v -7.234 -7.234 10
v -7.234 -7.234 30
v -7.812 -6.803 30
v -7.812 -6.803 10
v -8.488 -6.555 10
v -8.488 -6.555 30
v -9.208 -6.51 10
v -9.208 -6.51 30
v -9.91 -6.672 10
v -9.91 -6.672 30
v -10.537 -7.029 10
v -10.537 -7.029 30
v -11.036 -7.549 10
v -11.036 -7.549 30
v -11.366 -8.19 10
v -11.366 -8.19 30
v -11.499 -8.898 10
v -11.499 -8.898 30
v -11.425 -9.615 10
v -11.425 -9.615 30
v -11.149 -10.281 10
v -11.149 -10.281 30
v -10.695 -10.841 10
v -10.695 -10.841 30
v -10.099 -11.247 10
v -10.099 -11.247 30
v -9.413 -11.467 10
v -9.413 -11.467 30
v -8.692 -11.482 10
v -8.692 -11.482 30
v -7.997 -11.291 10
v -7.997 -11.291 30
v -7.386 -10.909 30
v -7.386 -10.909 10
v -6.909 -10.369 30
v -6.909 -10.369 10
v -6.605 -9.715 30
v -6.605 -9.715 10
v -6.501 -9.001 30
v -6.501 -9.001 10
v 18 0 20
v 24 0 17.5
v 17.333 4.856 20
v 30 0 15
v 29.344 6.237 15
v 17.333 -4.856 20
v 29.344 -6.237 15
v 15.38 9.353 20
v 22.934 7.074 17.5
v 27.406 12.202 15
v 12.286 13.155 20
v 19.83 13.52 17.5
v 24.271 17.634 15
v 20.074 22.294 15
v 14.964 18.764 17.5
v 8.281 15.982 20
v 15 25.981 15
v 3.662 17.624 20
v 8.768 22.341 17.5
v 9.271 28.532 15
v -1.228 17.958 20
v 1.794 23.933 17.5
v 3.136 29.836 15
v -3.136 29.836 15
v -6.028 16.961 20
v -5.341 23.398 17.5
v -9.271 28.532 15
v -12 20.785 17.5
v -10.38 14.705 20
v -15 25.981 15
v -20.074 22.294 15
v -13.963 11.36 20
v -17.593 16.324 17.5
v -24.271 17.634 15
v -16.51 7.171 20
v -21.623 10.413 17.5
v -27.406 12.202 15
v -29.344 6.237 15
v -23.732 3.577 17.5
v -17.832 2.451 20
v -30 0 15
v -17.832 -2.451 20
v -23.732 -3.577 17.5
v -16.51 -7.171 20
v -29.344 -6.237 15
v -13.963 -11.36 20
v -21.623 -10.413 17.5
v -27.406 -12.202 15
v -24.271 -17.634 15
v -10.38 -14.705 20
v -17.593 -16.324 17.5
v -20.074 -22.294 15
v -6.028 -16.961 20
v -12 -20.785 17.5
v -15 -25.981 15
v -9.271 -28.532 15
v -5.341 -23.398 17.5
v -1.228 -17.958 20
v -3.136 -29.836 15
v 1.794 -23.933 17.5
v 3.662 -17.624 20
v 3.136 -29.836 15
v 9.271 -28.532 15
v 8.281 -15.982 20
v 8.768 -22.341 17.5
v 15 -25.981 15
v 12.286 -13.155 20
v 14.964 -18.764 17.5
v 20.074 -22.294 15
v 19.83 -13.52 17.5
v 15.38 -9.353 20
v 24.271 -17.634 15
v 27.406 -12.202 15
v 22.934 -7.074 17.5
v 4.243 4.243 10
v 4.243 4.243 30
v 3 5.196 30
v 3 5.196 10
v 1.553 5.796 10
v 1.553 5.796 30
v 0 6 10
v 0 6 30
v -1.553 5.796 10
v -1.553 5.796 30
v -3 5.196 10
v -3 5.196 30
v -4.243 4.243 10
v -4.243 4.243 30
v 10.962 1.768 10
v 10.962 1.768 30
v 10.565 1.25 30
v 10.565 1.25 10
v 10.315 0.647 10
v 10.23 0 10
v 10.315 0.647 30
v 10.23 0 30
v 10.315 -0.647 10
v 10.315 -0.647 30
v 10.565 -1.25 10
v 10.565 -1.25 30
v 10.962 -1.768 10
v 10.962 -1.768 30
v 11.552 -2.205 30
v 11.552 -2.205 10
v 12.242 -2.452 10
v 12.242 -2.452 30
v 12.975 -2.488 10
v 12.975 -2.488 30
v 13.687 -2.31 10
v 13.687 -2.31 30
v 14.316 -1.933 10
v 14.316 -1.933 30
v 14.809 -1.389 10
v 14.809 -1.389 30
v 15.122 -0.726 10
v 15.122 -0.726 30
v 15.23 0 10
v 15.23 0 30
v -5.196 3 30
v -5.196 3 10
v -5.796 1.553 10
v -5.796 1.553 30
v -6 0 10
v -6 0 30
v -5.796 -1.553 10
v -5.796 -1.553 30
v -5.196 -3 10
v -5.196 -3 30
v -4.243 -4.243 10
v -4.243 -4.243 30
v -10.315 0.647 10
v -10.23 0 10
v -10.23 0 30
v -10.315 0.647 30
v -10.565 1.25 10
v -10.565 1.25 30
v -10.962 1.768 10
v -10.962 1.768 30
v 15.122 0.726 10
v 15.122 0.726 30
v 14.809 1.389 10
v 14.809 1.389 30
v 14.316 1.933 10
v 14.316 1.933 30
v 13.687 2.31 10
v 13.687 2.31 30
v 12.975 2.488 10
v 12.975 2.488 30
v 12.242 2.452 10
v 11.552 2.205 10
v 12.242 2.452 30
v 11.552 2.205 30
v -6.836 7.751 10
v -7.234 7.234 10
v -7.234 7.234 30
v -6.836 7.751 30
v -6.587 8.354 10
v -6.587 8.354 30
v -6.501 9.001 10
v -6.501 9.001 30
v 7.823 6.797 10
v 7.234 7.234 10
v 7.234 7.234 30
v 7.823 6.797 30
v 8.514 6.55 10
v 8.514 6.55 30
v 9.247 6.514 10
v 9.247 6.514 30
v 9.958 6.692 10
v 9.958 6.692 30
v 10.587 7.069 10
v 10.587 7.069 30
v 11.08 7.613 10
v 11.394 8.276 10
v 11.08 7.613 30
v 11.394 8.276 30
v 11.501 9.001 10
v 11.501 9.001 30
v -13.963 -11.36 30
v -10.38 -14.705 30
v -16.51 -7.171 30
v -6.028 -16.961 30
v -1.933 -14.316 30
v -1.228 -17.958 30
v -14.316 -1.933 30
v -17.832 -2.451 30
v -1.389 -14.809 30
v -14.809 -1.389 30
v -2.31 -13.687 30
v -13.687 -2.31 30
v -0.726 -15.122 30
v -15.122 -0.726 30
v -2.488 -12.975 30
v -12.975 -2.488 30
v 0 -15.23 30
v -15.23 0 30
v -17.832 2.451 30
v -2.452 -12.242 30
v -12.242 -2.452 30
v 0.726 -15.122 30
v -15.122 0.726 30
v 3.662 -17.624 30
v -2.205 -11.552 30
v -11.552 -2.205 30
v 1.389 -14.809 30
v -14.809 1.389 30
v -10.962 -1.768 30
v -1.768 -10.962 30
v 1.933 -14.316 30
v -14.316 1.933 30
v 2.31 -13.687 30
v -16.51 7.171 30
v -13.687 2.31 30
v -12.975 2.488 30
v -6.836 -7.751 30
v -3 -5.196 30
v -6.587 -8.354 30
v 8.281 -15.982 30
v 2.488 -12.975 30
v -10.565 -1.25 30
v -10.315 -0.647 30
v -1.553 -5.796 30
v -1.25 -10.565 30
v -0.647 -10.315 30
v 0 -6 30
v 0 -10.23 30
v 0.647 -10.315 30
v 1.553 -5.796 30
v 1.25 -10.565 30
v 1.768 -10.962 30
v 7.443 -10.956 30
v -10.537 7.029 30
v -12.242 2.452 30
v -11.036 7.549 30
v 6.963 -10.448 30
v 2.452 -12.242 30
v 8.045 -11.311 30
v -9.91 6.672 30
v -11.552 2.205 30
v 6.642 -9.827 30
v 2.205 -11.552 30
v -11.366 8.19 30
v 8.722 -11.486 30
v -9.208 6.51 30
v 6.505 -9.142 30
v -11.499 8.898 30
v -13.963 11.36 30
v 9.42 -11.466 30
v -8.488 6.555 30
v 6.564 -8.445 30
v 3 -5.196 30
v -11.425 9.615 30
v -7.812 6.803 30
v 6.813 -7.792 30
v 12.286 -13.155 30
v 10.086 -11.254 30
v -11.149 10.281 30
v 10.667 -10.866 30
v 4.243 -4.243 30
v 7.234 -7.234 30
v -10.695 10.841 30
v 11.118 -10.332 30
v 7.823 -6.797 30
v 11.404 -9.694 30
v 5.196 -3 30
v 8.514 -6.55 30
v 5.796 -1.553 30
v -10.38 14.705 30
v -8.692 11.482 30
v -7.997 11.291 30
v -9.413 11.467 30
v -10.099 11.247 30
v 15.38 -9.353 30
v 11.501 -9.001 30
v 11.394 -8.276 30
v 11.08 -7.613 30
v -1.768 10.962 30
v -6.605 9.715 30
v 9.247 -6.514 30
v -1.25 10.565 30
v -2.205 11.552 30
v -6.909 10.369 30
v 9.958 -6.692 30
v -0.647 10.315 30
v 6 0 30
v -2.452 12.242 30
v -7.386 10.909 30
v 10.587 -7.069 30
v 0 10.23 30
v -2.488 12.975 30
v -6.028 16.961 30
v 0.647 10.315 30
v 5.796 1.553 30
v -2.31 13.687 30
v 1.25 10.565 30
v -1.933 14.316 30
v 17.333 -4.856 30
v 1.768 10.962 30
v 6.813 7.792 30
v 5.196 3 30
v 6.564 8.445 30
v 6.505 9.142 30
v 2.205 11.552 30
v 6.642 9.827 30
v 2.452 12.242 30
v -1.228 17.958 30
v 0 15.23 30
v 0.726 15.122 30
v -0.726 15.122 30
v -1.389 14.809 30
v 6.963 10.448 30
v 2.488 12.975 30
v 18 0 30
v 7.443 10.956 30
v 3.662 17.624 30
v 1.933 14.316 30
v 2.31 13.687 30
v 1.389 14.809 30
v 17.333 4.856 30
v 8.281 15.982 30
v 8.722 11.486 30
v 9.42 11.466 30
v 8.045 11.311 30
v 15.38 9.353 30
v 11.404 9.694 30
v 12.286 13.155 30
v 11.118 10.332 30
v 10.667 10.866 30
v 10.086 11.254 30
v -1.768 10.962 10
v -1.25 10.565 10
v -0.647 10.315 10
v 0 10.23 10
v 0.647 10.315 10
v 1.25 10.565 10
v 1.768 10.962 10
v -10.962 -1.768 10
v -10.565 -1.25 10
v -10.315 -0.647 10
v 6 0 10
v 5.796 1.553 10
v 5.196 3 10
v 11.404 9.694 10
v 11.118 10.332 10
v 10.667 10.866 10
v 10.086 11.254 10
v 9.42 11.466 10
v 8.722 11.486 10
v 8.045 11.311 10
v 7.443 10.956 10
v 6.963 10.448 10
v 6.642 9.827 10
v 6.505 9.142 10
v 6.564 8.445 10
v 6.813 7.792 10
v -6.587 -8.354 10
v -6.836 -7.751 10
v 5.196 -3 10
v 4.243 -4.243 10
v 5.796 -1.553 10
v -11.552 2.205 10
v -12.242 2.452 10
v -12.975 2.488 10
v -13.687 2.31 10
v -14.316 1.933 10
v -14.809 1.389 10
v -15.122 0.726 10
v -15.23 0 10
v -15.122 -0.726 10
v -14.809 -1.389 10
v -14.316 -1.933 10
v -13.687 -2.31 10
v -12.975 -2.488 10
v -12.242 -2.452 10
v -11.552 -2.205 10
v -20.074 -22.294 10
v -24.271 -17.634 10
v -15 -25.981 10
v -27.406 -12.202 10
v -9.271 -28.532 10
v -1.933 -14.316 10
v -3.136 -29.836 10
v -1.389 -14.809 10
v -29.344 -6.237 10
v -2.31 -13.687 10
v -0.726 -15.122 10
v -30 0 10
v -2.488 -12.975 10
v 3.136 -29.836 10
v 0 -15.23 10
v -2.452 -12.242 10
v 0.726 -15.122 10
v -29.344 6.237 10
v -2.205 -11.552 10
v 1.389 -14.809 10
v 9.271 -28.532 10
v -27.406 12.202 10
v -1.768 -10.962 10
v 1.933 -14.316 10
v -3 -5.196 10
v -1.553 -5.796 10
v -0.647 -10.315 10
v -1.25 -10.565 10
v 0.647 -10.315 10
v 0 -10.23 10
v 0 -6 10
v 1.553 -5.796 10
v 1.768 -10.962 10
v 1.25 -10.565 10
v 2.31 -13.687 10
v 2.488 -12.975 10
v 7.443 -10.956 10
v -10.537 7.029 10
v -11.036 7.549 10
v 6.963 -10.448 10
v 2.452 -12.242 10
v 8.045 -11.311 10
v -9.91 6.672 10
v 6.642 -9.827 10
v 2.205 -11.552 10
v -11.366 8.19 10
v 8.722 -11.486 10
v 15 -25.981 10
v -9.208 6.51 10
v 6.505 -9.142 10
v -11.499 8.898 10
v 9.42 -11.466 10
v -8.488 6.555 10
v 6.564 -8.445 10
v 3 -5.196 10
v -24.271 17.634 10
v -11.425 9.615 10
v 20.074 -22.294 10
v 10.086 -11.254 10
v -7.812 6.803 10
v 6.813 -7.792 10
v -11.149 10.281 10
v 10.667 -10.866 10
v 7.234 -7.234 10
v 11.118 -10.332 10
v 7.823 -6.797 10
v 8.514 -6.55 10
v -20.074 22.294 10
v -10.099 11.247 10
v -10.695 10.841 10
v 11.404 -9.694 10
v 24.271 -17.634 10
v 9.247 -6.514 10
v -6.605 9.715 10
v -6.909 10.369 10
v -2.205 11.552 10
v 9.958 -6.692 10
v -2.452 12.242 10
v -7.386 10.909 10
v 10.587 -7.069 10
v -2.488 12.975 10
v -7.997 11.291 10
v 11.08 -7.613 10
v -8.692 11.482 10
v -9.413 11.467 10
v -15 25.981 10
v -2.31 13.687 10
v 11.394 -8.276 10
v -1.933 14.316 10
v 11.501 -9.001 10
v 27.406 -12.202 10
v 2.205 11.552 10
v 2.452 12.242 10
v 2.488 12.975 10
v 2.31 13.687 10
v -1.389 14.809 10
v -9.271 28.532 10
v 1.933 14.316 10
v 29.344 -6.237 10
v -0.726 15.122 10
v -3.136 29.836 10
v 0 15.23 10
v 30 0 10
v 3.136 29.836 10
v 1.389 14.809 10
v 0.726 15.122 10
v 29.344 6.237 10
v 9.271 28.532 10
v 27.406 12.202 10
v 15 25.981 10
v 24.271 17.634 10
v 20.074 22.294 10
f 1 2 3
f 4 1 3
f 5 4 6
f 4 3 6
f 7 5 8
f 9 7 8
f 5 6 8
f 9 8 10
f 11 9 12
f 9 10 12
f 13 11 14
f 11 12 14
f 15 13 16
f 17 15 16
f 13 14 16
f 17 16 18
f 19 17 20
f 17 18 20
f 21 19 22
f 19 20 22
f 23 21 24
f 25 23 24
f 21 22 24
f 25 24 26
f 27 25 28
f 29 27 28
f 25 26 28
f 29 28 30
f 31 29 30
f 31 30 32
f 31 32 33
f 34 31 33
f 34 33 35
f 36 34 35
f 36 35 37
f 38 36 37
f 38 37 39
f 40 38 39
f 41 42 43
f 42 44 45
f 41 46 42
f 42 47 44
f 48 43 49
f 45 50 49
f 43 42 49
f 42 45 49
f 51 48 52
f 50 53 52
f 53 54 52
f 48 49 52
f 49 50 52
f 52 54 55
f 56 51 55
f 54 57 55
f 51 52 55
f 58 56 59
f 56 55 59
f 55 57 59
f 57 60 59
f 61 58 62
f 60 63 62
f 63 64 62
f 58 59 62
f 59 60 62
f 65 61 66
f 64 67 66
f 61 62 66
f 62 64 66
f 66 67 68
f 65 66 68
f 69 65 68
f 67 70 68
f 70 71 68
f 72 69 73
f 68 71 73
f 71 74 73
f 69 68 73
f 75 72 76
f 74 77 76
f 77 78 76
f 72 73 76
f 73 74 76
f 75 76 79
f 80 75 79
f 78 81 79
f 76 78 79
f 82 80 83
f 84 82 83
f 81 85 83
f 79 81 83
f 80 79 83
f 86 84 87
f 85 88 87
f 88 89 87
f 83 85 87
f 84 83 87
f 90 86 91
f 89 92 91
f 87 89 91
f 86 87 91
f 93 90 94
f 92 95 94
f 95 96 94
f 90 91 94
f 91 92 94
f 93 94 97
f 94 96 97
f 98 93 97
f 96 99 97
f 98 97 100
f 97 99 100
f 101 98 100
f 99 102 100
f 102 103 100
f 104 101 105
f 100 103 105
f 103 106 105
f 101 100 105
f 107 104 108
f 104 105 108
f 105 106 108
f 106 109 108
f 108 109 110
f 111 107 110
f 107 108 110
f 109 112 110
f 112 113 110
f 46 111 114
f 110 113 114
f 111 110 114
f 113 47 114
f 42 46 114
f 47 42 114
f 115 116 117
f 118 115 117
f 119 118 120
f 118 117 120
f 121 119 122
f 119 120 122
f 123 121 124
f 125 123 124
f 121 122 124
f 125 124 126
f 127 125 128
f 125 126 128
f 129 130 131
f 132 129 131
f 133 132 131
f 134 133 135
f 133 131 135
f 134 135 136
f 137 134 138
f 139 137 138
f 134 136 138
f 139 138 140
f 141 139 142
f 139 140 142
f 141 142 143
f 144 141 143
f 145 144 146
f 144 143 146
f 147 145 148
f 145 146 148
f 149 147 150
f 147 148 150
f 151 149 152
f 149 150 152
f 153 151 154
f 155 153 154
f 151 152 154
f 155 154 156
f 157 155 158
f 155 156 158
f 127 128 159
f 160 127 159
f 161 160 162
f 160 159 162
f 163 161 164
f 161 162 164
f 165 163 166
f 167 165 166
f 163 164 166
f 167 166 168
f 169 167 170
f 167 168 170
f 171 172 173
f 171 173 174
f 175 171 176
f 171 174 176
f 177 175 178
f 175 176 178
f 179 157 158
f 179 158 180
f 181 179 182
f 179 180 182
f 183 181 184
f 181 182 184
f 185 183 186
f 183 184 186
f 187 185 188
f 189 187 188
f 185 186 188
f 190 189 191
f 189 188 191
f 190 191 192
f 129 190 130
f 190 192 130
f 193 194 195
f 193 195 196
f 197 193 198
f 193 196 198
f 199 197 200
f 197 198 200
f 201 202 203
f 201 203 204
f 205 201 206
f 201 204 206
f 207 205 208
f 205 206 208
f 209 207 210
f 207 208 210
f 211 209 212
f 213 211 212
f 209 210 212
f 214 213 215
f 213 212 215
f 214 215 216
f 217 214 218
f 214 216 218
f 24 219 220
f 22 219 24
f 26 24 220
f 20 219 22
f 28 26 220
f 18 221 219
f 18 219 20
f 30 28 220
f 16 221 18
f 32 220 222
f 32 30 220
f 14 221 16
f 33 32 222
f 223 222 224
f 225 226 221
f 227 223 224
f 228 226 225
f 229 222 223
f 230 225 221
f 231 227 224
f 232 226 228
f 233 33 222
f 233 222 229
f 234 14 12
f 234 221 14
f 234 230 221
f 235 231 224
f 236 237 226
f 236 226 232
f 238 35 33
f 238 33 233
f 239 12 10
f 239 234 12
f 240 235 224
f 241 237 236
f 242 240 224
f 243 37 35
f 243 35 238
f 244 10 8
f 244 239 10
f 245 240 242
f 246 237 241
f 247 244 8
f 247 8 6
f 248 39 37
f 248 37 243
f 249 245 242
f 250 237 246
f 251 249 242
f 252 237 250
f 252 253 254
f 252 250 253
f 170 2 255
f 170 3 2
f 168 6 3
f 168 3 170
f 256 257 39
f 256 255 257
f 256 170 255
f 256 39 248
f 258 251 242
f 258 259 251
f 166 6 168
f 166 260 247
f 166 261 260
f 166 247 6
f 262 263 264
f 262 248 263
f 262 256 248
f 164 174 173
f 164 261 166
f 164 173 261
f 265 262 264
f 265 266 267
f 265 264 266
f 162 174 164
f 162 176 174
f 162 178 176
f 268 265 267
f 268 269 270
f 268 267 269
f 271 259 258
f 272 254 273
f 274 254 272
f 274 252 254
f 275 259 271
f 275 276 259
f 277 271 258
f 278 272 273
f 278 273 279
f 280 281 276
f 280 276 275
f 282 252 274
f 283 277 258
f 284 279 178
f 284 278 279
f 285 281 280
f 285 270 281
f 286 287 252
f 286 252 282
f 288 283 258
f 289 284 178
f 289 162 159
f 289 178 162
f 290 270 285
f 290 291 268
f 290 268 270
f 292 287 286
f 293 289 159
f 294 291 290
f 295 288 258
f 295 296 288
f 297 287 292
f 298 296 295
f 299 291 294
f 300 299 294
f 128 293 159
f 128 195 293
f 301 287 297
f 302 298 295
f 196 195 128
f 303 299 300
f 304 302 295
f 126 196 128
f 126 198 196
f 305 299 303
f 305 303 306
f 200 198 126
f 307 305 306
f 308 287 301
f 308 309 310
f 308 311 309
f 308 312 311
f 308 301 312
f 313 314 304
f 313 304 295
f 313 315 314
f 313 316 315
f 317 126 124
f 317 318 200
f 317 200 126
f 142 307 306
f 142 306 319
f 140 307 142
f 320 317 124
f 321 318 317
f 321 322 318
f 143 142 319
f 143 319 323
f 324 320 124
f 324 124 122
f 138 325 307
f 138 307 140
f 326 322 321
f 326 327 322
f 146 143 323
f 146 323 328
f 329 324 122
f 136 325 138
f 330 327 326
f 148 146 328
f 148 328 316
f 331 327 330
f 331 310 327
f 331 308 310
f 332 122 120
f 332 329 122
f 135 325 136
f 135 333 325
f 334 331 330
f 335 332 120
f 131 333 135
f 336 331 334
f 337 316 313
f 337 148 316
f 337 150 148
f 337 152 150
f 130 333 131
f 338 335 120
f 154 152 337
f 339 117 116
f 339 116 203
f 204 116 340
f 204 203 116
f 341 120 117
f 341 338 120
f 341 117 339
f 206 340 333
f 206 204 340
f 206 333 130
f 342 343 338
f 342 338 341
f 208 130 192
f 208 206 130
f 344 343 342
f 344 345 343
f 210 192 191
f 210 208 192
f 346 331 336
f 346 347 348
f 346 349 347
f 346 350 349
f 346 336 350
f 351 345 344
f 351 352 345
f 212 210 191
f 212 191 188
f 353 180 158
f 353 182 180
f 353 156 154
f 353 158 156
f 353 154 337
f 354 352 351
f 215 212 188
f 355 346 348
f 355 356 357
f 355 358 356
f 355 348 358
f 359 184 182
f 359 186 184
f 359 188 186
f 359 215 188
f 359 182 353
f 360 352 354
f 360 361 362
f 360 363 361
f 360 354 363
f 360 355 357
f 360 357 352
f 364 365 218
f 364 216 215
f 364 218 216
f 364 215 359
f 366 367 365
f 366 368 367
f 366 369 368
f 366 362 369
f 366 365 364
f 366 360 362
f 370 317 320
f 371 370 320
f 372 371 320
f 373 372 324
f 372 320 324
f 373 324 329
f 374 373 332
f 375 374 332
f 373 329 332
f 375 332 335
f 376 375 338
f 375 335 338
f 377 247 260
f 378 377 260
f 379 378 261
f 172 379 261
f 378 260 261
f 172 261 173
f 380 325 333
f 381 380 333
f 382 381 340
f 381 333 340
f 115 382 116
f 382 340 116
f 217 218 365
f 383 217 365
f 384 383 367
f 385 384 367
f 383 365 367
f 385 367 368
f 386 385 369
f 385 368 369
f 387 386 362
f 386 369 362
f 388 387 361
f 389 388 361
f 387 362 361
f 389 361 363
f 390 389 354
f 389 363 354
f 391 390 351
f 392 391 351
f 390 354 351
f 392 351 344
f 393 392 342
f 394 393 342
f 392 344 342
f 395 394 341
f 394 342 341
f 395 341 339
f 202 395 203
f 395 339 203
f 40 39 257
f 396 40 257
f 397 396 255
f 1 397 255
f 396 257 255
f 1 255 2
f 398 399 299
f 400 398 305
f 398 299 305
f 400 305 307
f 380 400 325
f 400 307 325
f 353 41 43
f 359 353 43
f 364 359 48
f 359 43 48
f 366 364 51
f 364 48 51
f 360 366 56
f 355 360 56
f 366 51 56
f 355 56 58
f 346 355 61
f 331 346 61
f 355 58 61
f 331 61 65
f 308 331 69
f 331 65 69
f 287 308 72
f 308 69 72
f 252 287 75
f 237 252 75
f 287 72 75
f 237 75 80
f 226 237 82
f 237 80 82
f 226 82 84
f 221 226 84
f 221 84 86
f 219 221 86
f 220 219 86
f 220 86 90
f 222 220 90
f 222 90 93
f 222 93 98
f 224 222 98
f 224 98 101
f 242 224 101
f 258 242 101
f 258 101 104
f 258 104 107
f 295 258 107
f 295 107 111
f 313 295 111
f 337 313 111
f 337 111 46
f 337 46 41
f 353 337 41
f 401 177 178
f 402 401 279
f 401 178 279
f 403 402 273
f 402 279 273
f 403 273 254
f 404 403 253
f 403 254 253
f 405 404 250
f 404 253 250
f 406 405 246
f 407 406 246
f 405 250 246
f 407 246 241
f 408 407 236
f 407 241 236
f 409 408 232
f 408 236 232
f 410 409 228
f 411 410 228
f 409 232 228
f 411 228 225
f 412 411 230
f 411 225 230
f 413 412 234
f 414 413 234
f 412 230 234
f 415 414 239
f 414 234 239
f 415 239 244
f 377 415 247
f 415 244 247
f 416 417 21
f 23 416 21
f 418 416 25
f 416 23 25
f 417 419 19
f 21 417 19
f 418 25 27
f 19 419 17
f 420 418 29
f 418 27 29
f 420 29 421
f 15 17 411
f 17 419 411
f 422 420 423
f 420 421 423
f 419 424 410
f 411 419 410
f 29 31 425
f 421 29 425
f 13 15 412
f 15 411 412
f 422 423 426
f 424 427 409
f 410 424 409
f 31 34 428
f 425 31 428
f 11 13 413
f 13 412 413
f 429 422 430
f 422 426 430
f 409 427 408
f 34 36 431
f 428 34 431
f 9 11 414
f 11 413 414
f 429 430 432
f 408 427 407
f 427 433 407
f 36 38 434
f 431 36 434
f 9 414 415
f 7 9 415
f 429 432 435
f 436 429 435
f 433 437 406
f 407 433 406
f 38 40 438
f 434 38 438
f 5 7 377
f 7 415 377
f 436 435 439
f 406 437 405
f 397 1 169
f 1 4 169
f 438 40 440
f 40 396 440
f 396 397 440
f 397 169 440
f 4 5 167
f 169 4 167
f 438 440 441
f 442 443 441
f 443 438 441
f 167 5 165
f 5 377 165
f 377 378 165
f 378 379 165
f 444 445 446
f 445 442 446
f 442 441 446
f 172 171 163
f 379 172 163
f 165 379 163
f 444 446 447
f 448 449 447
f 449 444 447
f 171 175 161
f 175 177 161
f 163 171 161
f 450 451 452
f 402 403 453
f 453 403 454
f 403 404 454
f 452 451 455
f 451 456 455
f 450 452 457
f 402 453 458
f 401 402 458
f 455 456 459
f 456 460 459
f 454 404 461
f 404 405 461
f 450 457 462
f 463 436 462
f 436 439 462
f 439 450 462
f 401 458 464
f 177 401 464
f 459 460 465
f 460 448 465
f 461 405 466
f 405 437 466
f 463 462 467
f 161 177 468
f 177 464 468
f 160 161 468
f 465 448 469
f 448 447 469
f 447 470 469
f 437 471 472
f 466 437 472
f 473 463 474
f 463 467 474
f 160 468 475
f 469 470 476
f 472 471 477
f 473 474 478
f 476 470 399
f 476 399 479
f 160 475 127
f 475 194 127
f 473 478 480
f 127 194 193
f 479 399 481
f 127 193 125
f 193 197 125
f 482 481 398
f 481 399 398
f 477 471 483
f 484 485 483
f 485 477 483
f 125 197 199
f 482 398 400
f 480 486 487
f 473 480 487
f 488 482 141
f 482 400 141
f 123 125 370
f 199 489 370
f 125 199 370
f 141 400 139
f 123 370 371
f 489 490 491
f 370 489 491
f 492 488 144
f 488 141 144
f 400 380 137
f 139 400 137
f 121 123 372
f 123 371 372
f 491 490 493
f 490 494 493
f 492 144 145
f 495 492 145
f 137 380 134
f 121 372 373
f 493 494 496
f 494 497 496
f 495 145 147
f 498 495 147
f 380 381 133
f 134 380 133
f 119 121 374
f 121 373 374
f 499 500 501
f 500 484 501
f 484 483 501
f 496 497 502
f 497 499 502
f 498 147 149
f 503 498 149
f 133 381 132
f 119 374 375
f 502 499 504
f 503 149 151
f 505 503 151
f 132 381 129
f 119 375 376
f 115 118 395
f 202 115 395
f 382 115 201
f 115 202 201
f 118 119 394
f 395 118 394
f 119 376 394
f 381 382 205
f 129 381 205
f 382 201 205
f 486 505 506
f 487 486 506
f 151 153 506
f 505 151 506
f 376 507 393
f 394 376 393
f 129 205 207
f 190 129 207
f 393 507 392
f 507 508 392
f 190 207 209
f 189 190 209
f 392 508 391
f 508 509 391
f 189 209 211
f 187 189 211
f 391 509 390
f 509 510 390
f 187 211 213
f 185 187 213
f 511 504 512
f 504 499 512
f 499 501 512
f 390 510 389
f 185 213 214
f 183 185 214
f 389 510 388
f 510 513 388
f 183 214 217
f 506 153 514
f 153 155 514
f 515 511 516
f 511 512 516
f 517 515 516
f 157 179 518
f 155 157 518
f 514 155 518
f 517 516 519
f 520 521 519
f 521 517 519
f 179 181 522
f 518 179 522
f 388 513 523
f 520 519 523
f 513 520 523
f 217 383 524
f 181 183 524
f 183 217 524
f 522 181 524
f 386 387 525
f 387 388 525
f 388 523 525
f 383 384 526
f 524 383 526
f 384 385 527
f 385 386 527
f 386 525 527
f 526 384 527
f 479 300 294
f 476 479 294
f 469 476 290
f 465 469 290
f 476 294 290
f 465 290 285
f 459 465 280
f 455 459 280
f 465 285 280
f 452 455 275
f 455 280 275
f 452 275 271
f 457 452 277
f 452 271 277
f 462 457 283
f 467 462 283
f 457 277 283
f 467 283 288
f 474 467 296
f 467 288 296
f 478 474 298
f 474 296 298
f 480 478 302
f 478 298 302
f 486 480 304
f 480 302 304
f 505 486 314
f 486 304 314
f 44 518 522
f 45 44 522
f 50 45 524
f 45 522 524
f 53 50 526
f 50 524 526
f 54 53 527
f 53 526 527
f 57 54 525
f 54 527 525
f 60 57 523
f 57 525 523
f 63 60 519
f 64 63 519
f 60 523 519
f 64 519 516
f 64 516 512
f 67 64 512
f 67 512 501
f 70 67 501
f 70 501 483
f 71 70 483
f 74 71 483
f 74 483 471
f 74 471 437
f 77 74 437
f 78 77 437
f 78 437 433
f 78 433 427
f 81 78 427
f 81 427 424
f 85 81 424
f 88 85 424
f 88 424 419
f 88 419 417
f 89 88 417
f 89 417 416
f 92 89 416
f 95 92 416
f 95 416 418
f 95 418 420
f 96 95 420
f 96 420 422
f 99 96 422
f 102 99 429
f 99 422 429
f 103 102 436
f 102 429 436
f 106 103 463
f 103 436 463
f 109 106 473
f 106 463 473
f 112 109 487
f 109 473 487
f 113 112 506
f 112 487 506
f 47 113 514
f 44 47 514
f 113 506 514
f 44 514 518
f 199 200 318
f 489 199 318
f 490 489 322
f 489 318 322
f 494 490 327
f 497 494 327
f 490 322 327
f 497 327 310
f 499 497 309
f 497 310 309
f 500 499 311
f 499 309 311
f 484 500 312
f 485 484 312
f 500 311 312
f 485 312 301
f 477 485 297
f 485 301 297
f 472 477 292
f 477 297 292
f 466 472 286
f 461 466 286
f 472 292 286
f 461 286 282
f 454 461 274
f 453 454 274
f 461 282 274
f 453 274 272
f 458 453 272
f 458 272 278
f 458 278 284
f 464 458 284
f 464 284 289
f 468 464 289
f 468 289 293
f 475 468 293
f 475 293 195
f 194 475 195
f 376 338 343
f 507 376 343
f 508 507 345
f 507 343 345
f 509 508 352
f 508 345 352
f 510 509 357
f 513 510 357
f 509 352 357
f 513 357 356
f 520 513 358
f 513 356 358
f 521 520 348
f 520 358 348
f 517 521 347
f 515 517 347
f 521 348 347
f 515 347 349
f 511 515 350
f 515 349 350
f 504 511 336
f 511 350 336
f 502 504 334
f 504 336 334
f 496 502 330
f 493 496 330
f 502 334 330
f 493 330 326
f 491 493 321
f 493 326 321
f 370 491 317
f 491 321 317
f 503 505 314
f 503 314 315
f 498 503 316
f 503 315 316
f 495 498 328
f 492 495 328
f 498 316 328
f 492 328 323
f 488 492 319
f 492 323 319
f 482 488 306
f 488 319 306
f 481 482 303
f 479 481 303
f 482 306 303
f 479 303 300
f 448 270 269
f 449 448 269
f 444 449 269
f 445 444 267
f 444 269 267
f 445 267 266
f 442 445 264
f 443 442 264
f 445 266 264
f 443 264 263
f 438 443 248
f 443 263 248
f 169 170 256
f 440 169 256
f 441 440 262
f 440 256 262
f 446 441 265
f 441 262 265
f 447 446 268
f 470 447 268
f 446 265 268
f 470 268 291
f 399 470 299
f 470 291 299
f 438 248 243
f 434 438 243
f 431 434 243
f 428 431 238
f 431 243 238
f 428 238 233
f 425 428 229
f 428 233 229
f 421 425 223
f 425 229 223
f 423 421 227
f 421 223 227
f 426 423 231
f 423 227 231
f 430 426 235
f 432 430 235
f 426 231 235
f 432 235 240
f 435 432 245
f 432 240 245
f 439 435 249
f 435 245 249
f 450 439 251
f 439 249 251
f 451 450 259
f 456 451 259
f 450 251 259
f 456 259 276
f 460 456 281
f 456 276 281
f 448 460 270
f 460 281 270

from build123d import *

# Parameters (mm, degrees)
F0_R     = 30
F1_DEPTH = 20
F2_SIZE2 = 5
F2_SIZE  = 12
F3_DEPTH = 20
F5_DEPTH = 50
F6_DEPTH = 10
F7_DEPTH = 10


with BuildPart() as f1:
    # F0 (on Top) → F1 (new body)
    with BuildSketch(Plane.XY):
        Circle(F0_R)
    extrude(amount=F1_DEPTH)

    # F2
    f2_edges = [f1.edges().sort_by_distance(p)[0] for p in [
        (-30, 0, 20),
    ]]
    f2_side = f1.faces().sort_by_distance((0, 0, 20))[0]
    chamfer(f2_edges, length=F2_SIZE, length2=F2_SIZE2, reference=f2_side)

    # F3 (add): a face of the model
    f3_faces = [f1.faces().sort_by_distance(p)[0] for p in [
        (0, 0, 20),
    ]]
    extrude(f3_faces, amount=F3_DEPTH)

    # F4 (on face) → F5 (cut)
    with BuildSketch(Plane.XY.offset(40)):
        with BuildLine():
            Line((-12.73, 0), (-10.962233047, 1.767766953))
            ThreePointArc((-10.962233047, 1.767766953), (-15.23, 0), (-10.962233047, -1.767766953))
            Line((-10.962233047, -1.767766953), (-12.73, 0))
        make_face()
        with BuildLine():
            ThreePointArc((-10.23, 0), (-10.4203011687, 0.9567085809), (-10.962233047, 1.767766953))
            Line((-10.962233047, 1.767766953), (-12.73, 0))
            Line((-12.73, 0), (-10.962233047, -1.767766953))
            ThreePointArc((-10.962233047, -1.767766953), (-10.4203011687, -0.9567085809), (-10.23, 0))
        make_face()
        with BuildLine():
            Line((0, 0), (4.2426406871, 4.2426406871))
            ThreePointArc((4.2426406871, 4.2426406871), (0, 6), (-4.2426406871, 4.2426406871))
            Line((-4.2426406871, 4.2426406871), (0, 0))
        make_face()
        with BuildLine():
            Line((0, 0), (-4.2426406871, 4.2426406871))
            ThreePointArc((-4.2426406871, 4.2426406871), (-6, 0), (-4.2426406871, -4.2426406871))
            Line((-4.2426406871, -4.2426406871), (0, 0))
        make_face()
        with BuildLine():
            ThreePointArc((-4.2426406871, -4.2426406871), (0, -6), (4.2426406871, -4.2426406871))
            Line((4.2426406871, -4.2426406871), (0, 0))
            Line((0, 0), (-4.2426406871, -4.2426406871))
        make_face()
        with BuildLine():
            ThreePointArc((4.2426406871, -4.2426406871), (5.5432771951, -2.2961005942), (6, 0))
            ThreePointArc((6, 0), (5.5432771951, 2.2961005942), (4.2426406871, 4.2426406871))
            Line((4.2426406871, 4.2426406871), (0, 0))
            Line((0, 0), (4.2426406871, -4.2426406871))
        make_face()
        with BuildLine():
            ThreePointArc((-1.767766953, 10.962233047), (0, 10.23), (1.767766953, 10.962233047))
            Line((1.767766953, 10.962233047), (0, 12.73))
            Line((0, 12.73), (-1.767766953, 10.962233047))
        make_face()
        with BuildLine():
            Line((0, 12.73), (1.767766953, 10.962233047))
            ThreePointArc((1.767766953, 10.962233047), (2.3096988313, 11.7732914191), (2.5, 12.73))
            ThreePointArc((2.5, 12.73), (-0.9567085809, 15.0396988313), (-1.767766953, 10.962233047))
            Line((-1.767766953, 10.962233047), (0, 12.73))
        make_face()
        with BuildLine():
            Line((12.73, 0), (10.962233047, 1.767766953))
            ThreePointArc((10.962233047, 1.767766953), (10.23, 0), (10.962233047, -1.767766953))
            Line((10.962233047, -1.767766953), (12.73, 0))
        make_face()
        with BuildLine():
            ThreePointArc((15.23, 0), (13.6867085809, 2.3096988313), (10.962233047, 1.767766953))
            Line((10.962233047, 1.767766953), (12.73, 0))
            Line((12.73, 0), (10.962233047, -1.767766953))
            ThreePointArc((10.962233047, -1.767766953), (13.6867085809, -2.3096988313), (15.23, 0))
        make_face()
        with BuildLine():
            Line((0, -12.73), (1.767766953, -10.962233047))
            ThreePointArc((1.767766953, -10.962233047), (0, -10.23), (-1.767766953, -10.962233047))
            Line((-1.767766953, -10.962233047), (0, -12.73))
        make_face()
        with BuildLine():
            ThreePointArc((2.5, -12.73), (2.3096988313, -11.7732914191), (1.767766953, -10.962233047))
            Line((1.767766953, -10.962233047), (0, -12.73))
            Line((0, -12.73), (-1.767766953, -10.962233047))
            ThreePointArc((-1.767766953, -10.962233047), (-0.9567085809, -15.0396988313), (2.5, -12.73))
        make_face()
        with BuildLine():
            ThreePointArc((11.5014693245, 9.0014693245), (8.0447607436, 11.3111681558), (7.2337023715, 7.2337023715))
            ThreePointArc((7.2337023715, 7.2337023715), (9.9581779054, 6.6917704932), (11.5014693245, 9.0014693245))
        make_face()
        with BuildLine():
            ThreePointArc((-6.5014693245, 9.0014693245), (-11.3111681558, 9.9581779054), (-7.2337023715, 7.2337023715))
            ThreePointArc((-7.2337023715, 7.2337023715), (-6.6917704932, 8.0447607436), (-6.5014693245, 9.0014693245))
        make_face()
        with BuildLine():
            ThreePointArc((-6.5014693245, -9.0014693245), (-6.6917704932, -8.0447607436), (-7.2337023715, -7.2337023715))
            ThreePointArc((-7.2337023715, -7.2337023715), (-11.3111681558, -9.9581779054), (-6.5014693245, -9.0014693245))
        make_face()
        with BuildLine():
            ThreePointArc((11.5014693245, -9.0014693245), (9.9581779054, -6.6917704932), (7.2337023715, -7.2337023715))
            ThreePointArc((7.2337023715, -7.2337023715), (8.0447607436, -11.3111681558), (11.5014693245, -9.0014693245))
        make_face()
    extrude(amount=-F5_DEPTH, mode=Mode.SUBTRACT)

    # F6 (cut): a face of the model
    f6_faces = [f1.faces().sort_by_distance(p)[0] for p in [
        (-17.4908831175, 0, 40),
    ]]
    extrude(f6_faces, amount=-F6_DEPTH, mode=Mode.SUBTRACT)

    # F7 (cut): a face of the model
    f7_faces = [f1.faces().sort_by_distance(p)[0] for p in [
        (-29.1514718626, 0, 0),
    ]]
    extrude(f7_faces, amount=-F7_DEPTH, mode=Mode.SUBTRACT)


solid = f1.part
